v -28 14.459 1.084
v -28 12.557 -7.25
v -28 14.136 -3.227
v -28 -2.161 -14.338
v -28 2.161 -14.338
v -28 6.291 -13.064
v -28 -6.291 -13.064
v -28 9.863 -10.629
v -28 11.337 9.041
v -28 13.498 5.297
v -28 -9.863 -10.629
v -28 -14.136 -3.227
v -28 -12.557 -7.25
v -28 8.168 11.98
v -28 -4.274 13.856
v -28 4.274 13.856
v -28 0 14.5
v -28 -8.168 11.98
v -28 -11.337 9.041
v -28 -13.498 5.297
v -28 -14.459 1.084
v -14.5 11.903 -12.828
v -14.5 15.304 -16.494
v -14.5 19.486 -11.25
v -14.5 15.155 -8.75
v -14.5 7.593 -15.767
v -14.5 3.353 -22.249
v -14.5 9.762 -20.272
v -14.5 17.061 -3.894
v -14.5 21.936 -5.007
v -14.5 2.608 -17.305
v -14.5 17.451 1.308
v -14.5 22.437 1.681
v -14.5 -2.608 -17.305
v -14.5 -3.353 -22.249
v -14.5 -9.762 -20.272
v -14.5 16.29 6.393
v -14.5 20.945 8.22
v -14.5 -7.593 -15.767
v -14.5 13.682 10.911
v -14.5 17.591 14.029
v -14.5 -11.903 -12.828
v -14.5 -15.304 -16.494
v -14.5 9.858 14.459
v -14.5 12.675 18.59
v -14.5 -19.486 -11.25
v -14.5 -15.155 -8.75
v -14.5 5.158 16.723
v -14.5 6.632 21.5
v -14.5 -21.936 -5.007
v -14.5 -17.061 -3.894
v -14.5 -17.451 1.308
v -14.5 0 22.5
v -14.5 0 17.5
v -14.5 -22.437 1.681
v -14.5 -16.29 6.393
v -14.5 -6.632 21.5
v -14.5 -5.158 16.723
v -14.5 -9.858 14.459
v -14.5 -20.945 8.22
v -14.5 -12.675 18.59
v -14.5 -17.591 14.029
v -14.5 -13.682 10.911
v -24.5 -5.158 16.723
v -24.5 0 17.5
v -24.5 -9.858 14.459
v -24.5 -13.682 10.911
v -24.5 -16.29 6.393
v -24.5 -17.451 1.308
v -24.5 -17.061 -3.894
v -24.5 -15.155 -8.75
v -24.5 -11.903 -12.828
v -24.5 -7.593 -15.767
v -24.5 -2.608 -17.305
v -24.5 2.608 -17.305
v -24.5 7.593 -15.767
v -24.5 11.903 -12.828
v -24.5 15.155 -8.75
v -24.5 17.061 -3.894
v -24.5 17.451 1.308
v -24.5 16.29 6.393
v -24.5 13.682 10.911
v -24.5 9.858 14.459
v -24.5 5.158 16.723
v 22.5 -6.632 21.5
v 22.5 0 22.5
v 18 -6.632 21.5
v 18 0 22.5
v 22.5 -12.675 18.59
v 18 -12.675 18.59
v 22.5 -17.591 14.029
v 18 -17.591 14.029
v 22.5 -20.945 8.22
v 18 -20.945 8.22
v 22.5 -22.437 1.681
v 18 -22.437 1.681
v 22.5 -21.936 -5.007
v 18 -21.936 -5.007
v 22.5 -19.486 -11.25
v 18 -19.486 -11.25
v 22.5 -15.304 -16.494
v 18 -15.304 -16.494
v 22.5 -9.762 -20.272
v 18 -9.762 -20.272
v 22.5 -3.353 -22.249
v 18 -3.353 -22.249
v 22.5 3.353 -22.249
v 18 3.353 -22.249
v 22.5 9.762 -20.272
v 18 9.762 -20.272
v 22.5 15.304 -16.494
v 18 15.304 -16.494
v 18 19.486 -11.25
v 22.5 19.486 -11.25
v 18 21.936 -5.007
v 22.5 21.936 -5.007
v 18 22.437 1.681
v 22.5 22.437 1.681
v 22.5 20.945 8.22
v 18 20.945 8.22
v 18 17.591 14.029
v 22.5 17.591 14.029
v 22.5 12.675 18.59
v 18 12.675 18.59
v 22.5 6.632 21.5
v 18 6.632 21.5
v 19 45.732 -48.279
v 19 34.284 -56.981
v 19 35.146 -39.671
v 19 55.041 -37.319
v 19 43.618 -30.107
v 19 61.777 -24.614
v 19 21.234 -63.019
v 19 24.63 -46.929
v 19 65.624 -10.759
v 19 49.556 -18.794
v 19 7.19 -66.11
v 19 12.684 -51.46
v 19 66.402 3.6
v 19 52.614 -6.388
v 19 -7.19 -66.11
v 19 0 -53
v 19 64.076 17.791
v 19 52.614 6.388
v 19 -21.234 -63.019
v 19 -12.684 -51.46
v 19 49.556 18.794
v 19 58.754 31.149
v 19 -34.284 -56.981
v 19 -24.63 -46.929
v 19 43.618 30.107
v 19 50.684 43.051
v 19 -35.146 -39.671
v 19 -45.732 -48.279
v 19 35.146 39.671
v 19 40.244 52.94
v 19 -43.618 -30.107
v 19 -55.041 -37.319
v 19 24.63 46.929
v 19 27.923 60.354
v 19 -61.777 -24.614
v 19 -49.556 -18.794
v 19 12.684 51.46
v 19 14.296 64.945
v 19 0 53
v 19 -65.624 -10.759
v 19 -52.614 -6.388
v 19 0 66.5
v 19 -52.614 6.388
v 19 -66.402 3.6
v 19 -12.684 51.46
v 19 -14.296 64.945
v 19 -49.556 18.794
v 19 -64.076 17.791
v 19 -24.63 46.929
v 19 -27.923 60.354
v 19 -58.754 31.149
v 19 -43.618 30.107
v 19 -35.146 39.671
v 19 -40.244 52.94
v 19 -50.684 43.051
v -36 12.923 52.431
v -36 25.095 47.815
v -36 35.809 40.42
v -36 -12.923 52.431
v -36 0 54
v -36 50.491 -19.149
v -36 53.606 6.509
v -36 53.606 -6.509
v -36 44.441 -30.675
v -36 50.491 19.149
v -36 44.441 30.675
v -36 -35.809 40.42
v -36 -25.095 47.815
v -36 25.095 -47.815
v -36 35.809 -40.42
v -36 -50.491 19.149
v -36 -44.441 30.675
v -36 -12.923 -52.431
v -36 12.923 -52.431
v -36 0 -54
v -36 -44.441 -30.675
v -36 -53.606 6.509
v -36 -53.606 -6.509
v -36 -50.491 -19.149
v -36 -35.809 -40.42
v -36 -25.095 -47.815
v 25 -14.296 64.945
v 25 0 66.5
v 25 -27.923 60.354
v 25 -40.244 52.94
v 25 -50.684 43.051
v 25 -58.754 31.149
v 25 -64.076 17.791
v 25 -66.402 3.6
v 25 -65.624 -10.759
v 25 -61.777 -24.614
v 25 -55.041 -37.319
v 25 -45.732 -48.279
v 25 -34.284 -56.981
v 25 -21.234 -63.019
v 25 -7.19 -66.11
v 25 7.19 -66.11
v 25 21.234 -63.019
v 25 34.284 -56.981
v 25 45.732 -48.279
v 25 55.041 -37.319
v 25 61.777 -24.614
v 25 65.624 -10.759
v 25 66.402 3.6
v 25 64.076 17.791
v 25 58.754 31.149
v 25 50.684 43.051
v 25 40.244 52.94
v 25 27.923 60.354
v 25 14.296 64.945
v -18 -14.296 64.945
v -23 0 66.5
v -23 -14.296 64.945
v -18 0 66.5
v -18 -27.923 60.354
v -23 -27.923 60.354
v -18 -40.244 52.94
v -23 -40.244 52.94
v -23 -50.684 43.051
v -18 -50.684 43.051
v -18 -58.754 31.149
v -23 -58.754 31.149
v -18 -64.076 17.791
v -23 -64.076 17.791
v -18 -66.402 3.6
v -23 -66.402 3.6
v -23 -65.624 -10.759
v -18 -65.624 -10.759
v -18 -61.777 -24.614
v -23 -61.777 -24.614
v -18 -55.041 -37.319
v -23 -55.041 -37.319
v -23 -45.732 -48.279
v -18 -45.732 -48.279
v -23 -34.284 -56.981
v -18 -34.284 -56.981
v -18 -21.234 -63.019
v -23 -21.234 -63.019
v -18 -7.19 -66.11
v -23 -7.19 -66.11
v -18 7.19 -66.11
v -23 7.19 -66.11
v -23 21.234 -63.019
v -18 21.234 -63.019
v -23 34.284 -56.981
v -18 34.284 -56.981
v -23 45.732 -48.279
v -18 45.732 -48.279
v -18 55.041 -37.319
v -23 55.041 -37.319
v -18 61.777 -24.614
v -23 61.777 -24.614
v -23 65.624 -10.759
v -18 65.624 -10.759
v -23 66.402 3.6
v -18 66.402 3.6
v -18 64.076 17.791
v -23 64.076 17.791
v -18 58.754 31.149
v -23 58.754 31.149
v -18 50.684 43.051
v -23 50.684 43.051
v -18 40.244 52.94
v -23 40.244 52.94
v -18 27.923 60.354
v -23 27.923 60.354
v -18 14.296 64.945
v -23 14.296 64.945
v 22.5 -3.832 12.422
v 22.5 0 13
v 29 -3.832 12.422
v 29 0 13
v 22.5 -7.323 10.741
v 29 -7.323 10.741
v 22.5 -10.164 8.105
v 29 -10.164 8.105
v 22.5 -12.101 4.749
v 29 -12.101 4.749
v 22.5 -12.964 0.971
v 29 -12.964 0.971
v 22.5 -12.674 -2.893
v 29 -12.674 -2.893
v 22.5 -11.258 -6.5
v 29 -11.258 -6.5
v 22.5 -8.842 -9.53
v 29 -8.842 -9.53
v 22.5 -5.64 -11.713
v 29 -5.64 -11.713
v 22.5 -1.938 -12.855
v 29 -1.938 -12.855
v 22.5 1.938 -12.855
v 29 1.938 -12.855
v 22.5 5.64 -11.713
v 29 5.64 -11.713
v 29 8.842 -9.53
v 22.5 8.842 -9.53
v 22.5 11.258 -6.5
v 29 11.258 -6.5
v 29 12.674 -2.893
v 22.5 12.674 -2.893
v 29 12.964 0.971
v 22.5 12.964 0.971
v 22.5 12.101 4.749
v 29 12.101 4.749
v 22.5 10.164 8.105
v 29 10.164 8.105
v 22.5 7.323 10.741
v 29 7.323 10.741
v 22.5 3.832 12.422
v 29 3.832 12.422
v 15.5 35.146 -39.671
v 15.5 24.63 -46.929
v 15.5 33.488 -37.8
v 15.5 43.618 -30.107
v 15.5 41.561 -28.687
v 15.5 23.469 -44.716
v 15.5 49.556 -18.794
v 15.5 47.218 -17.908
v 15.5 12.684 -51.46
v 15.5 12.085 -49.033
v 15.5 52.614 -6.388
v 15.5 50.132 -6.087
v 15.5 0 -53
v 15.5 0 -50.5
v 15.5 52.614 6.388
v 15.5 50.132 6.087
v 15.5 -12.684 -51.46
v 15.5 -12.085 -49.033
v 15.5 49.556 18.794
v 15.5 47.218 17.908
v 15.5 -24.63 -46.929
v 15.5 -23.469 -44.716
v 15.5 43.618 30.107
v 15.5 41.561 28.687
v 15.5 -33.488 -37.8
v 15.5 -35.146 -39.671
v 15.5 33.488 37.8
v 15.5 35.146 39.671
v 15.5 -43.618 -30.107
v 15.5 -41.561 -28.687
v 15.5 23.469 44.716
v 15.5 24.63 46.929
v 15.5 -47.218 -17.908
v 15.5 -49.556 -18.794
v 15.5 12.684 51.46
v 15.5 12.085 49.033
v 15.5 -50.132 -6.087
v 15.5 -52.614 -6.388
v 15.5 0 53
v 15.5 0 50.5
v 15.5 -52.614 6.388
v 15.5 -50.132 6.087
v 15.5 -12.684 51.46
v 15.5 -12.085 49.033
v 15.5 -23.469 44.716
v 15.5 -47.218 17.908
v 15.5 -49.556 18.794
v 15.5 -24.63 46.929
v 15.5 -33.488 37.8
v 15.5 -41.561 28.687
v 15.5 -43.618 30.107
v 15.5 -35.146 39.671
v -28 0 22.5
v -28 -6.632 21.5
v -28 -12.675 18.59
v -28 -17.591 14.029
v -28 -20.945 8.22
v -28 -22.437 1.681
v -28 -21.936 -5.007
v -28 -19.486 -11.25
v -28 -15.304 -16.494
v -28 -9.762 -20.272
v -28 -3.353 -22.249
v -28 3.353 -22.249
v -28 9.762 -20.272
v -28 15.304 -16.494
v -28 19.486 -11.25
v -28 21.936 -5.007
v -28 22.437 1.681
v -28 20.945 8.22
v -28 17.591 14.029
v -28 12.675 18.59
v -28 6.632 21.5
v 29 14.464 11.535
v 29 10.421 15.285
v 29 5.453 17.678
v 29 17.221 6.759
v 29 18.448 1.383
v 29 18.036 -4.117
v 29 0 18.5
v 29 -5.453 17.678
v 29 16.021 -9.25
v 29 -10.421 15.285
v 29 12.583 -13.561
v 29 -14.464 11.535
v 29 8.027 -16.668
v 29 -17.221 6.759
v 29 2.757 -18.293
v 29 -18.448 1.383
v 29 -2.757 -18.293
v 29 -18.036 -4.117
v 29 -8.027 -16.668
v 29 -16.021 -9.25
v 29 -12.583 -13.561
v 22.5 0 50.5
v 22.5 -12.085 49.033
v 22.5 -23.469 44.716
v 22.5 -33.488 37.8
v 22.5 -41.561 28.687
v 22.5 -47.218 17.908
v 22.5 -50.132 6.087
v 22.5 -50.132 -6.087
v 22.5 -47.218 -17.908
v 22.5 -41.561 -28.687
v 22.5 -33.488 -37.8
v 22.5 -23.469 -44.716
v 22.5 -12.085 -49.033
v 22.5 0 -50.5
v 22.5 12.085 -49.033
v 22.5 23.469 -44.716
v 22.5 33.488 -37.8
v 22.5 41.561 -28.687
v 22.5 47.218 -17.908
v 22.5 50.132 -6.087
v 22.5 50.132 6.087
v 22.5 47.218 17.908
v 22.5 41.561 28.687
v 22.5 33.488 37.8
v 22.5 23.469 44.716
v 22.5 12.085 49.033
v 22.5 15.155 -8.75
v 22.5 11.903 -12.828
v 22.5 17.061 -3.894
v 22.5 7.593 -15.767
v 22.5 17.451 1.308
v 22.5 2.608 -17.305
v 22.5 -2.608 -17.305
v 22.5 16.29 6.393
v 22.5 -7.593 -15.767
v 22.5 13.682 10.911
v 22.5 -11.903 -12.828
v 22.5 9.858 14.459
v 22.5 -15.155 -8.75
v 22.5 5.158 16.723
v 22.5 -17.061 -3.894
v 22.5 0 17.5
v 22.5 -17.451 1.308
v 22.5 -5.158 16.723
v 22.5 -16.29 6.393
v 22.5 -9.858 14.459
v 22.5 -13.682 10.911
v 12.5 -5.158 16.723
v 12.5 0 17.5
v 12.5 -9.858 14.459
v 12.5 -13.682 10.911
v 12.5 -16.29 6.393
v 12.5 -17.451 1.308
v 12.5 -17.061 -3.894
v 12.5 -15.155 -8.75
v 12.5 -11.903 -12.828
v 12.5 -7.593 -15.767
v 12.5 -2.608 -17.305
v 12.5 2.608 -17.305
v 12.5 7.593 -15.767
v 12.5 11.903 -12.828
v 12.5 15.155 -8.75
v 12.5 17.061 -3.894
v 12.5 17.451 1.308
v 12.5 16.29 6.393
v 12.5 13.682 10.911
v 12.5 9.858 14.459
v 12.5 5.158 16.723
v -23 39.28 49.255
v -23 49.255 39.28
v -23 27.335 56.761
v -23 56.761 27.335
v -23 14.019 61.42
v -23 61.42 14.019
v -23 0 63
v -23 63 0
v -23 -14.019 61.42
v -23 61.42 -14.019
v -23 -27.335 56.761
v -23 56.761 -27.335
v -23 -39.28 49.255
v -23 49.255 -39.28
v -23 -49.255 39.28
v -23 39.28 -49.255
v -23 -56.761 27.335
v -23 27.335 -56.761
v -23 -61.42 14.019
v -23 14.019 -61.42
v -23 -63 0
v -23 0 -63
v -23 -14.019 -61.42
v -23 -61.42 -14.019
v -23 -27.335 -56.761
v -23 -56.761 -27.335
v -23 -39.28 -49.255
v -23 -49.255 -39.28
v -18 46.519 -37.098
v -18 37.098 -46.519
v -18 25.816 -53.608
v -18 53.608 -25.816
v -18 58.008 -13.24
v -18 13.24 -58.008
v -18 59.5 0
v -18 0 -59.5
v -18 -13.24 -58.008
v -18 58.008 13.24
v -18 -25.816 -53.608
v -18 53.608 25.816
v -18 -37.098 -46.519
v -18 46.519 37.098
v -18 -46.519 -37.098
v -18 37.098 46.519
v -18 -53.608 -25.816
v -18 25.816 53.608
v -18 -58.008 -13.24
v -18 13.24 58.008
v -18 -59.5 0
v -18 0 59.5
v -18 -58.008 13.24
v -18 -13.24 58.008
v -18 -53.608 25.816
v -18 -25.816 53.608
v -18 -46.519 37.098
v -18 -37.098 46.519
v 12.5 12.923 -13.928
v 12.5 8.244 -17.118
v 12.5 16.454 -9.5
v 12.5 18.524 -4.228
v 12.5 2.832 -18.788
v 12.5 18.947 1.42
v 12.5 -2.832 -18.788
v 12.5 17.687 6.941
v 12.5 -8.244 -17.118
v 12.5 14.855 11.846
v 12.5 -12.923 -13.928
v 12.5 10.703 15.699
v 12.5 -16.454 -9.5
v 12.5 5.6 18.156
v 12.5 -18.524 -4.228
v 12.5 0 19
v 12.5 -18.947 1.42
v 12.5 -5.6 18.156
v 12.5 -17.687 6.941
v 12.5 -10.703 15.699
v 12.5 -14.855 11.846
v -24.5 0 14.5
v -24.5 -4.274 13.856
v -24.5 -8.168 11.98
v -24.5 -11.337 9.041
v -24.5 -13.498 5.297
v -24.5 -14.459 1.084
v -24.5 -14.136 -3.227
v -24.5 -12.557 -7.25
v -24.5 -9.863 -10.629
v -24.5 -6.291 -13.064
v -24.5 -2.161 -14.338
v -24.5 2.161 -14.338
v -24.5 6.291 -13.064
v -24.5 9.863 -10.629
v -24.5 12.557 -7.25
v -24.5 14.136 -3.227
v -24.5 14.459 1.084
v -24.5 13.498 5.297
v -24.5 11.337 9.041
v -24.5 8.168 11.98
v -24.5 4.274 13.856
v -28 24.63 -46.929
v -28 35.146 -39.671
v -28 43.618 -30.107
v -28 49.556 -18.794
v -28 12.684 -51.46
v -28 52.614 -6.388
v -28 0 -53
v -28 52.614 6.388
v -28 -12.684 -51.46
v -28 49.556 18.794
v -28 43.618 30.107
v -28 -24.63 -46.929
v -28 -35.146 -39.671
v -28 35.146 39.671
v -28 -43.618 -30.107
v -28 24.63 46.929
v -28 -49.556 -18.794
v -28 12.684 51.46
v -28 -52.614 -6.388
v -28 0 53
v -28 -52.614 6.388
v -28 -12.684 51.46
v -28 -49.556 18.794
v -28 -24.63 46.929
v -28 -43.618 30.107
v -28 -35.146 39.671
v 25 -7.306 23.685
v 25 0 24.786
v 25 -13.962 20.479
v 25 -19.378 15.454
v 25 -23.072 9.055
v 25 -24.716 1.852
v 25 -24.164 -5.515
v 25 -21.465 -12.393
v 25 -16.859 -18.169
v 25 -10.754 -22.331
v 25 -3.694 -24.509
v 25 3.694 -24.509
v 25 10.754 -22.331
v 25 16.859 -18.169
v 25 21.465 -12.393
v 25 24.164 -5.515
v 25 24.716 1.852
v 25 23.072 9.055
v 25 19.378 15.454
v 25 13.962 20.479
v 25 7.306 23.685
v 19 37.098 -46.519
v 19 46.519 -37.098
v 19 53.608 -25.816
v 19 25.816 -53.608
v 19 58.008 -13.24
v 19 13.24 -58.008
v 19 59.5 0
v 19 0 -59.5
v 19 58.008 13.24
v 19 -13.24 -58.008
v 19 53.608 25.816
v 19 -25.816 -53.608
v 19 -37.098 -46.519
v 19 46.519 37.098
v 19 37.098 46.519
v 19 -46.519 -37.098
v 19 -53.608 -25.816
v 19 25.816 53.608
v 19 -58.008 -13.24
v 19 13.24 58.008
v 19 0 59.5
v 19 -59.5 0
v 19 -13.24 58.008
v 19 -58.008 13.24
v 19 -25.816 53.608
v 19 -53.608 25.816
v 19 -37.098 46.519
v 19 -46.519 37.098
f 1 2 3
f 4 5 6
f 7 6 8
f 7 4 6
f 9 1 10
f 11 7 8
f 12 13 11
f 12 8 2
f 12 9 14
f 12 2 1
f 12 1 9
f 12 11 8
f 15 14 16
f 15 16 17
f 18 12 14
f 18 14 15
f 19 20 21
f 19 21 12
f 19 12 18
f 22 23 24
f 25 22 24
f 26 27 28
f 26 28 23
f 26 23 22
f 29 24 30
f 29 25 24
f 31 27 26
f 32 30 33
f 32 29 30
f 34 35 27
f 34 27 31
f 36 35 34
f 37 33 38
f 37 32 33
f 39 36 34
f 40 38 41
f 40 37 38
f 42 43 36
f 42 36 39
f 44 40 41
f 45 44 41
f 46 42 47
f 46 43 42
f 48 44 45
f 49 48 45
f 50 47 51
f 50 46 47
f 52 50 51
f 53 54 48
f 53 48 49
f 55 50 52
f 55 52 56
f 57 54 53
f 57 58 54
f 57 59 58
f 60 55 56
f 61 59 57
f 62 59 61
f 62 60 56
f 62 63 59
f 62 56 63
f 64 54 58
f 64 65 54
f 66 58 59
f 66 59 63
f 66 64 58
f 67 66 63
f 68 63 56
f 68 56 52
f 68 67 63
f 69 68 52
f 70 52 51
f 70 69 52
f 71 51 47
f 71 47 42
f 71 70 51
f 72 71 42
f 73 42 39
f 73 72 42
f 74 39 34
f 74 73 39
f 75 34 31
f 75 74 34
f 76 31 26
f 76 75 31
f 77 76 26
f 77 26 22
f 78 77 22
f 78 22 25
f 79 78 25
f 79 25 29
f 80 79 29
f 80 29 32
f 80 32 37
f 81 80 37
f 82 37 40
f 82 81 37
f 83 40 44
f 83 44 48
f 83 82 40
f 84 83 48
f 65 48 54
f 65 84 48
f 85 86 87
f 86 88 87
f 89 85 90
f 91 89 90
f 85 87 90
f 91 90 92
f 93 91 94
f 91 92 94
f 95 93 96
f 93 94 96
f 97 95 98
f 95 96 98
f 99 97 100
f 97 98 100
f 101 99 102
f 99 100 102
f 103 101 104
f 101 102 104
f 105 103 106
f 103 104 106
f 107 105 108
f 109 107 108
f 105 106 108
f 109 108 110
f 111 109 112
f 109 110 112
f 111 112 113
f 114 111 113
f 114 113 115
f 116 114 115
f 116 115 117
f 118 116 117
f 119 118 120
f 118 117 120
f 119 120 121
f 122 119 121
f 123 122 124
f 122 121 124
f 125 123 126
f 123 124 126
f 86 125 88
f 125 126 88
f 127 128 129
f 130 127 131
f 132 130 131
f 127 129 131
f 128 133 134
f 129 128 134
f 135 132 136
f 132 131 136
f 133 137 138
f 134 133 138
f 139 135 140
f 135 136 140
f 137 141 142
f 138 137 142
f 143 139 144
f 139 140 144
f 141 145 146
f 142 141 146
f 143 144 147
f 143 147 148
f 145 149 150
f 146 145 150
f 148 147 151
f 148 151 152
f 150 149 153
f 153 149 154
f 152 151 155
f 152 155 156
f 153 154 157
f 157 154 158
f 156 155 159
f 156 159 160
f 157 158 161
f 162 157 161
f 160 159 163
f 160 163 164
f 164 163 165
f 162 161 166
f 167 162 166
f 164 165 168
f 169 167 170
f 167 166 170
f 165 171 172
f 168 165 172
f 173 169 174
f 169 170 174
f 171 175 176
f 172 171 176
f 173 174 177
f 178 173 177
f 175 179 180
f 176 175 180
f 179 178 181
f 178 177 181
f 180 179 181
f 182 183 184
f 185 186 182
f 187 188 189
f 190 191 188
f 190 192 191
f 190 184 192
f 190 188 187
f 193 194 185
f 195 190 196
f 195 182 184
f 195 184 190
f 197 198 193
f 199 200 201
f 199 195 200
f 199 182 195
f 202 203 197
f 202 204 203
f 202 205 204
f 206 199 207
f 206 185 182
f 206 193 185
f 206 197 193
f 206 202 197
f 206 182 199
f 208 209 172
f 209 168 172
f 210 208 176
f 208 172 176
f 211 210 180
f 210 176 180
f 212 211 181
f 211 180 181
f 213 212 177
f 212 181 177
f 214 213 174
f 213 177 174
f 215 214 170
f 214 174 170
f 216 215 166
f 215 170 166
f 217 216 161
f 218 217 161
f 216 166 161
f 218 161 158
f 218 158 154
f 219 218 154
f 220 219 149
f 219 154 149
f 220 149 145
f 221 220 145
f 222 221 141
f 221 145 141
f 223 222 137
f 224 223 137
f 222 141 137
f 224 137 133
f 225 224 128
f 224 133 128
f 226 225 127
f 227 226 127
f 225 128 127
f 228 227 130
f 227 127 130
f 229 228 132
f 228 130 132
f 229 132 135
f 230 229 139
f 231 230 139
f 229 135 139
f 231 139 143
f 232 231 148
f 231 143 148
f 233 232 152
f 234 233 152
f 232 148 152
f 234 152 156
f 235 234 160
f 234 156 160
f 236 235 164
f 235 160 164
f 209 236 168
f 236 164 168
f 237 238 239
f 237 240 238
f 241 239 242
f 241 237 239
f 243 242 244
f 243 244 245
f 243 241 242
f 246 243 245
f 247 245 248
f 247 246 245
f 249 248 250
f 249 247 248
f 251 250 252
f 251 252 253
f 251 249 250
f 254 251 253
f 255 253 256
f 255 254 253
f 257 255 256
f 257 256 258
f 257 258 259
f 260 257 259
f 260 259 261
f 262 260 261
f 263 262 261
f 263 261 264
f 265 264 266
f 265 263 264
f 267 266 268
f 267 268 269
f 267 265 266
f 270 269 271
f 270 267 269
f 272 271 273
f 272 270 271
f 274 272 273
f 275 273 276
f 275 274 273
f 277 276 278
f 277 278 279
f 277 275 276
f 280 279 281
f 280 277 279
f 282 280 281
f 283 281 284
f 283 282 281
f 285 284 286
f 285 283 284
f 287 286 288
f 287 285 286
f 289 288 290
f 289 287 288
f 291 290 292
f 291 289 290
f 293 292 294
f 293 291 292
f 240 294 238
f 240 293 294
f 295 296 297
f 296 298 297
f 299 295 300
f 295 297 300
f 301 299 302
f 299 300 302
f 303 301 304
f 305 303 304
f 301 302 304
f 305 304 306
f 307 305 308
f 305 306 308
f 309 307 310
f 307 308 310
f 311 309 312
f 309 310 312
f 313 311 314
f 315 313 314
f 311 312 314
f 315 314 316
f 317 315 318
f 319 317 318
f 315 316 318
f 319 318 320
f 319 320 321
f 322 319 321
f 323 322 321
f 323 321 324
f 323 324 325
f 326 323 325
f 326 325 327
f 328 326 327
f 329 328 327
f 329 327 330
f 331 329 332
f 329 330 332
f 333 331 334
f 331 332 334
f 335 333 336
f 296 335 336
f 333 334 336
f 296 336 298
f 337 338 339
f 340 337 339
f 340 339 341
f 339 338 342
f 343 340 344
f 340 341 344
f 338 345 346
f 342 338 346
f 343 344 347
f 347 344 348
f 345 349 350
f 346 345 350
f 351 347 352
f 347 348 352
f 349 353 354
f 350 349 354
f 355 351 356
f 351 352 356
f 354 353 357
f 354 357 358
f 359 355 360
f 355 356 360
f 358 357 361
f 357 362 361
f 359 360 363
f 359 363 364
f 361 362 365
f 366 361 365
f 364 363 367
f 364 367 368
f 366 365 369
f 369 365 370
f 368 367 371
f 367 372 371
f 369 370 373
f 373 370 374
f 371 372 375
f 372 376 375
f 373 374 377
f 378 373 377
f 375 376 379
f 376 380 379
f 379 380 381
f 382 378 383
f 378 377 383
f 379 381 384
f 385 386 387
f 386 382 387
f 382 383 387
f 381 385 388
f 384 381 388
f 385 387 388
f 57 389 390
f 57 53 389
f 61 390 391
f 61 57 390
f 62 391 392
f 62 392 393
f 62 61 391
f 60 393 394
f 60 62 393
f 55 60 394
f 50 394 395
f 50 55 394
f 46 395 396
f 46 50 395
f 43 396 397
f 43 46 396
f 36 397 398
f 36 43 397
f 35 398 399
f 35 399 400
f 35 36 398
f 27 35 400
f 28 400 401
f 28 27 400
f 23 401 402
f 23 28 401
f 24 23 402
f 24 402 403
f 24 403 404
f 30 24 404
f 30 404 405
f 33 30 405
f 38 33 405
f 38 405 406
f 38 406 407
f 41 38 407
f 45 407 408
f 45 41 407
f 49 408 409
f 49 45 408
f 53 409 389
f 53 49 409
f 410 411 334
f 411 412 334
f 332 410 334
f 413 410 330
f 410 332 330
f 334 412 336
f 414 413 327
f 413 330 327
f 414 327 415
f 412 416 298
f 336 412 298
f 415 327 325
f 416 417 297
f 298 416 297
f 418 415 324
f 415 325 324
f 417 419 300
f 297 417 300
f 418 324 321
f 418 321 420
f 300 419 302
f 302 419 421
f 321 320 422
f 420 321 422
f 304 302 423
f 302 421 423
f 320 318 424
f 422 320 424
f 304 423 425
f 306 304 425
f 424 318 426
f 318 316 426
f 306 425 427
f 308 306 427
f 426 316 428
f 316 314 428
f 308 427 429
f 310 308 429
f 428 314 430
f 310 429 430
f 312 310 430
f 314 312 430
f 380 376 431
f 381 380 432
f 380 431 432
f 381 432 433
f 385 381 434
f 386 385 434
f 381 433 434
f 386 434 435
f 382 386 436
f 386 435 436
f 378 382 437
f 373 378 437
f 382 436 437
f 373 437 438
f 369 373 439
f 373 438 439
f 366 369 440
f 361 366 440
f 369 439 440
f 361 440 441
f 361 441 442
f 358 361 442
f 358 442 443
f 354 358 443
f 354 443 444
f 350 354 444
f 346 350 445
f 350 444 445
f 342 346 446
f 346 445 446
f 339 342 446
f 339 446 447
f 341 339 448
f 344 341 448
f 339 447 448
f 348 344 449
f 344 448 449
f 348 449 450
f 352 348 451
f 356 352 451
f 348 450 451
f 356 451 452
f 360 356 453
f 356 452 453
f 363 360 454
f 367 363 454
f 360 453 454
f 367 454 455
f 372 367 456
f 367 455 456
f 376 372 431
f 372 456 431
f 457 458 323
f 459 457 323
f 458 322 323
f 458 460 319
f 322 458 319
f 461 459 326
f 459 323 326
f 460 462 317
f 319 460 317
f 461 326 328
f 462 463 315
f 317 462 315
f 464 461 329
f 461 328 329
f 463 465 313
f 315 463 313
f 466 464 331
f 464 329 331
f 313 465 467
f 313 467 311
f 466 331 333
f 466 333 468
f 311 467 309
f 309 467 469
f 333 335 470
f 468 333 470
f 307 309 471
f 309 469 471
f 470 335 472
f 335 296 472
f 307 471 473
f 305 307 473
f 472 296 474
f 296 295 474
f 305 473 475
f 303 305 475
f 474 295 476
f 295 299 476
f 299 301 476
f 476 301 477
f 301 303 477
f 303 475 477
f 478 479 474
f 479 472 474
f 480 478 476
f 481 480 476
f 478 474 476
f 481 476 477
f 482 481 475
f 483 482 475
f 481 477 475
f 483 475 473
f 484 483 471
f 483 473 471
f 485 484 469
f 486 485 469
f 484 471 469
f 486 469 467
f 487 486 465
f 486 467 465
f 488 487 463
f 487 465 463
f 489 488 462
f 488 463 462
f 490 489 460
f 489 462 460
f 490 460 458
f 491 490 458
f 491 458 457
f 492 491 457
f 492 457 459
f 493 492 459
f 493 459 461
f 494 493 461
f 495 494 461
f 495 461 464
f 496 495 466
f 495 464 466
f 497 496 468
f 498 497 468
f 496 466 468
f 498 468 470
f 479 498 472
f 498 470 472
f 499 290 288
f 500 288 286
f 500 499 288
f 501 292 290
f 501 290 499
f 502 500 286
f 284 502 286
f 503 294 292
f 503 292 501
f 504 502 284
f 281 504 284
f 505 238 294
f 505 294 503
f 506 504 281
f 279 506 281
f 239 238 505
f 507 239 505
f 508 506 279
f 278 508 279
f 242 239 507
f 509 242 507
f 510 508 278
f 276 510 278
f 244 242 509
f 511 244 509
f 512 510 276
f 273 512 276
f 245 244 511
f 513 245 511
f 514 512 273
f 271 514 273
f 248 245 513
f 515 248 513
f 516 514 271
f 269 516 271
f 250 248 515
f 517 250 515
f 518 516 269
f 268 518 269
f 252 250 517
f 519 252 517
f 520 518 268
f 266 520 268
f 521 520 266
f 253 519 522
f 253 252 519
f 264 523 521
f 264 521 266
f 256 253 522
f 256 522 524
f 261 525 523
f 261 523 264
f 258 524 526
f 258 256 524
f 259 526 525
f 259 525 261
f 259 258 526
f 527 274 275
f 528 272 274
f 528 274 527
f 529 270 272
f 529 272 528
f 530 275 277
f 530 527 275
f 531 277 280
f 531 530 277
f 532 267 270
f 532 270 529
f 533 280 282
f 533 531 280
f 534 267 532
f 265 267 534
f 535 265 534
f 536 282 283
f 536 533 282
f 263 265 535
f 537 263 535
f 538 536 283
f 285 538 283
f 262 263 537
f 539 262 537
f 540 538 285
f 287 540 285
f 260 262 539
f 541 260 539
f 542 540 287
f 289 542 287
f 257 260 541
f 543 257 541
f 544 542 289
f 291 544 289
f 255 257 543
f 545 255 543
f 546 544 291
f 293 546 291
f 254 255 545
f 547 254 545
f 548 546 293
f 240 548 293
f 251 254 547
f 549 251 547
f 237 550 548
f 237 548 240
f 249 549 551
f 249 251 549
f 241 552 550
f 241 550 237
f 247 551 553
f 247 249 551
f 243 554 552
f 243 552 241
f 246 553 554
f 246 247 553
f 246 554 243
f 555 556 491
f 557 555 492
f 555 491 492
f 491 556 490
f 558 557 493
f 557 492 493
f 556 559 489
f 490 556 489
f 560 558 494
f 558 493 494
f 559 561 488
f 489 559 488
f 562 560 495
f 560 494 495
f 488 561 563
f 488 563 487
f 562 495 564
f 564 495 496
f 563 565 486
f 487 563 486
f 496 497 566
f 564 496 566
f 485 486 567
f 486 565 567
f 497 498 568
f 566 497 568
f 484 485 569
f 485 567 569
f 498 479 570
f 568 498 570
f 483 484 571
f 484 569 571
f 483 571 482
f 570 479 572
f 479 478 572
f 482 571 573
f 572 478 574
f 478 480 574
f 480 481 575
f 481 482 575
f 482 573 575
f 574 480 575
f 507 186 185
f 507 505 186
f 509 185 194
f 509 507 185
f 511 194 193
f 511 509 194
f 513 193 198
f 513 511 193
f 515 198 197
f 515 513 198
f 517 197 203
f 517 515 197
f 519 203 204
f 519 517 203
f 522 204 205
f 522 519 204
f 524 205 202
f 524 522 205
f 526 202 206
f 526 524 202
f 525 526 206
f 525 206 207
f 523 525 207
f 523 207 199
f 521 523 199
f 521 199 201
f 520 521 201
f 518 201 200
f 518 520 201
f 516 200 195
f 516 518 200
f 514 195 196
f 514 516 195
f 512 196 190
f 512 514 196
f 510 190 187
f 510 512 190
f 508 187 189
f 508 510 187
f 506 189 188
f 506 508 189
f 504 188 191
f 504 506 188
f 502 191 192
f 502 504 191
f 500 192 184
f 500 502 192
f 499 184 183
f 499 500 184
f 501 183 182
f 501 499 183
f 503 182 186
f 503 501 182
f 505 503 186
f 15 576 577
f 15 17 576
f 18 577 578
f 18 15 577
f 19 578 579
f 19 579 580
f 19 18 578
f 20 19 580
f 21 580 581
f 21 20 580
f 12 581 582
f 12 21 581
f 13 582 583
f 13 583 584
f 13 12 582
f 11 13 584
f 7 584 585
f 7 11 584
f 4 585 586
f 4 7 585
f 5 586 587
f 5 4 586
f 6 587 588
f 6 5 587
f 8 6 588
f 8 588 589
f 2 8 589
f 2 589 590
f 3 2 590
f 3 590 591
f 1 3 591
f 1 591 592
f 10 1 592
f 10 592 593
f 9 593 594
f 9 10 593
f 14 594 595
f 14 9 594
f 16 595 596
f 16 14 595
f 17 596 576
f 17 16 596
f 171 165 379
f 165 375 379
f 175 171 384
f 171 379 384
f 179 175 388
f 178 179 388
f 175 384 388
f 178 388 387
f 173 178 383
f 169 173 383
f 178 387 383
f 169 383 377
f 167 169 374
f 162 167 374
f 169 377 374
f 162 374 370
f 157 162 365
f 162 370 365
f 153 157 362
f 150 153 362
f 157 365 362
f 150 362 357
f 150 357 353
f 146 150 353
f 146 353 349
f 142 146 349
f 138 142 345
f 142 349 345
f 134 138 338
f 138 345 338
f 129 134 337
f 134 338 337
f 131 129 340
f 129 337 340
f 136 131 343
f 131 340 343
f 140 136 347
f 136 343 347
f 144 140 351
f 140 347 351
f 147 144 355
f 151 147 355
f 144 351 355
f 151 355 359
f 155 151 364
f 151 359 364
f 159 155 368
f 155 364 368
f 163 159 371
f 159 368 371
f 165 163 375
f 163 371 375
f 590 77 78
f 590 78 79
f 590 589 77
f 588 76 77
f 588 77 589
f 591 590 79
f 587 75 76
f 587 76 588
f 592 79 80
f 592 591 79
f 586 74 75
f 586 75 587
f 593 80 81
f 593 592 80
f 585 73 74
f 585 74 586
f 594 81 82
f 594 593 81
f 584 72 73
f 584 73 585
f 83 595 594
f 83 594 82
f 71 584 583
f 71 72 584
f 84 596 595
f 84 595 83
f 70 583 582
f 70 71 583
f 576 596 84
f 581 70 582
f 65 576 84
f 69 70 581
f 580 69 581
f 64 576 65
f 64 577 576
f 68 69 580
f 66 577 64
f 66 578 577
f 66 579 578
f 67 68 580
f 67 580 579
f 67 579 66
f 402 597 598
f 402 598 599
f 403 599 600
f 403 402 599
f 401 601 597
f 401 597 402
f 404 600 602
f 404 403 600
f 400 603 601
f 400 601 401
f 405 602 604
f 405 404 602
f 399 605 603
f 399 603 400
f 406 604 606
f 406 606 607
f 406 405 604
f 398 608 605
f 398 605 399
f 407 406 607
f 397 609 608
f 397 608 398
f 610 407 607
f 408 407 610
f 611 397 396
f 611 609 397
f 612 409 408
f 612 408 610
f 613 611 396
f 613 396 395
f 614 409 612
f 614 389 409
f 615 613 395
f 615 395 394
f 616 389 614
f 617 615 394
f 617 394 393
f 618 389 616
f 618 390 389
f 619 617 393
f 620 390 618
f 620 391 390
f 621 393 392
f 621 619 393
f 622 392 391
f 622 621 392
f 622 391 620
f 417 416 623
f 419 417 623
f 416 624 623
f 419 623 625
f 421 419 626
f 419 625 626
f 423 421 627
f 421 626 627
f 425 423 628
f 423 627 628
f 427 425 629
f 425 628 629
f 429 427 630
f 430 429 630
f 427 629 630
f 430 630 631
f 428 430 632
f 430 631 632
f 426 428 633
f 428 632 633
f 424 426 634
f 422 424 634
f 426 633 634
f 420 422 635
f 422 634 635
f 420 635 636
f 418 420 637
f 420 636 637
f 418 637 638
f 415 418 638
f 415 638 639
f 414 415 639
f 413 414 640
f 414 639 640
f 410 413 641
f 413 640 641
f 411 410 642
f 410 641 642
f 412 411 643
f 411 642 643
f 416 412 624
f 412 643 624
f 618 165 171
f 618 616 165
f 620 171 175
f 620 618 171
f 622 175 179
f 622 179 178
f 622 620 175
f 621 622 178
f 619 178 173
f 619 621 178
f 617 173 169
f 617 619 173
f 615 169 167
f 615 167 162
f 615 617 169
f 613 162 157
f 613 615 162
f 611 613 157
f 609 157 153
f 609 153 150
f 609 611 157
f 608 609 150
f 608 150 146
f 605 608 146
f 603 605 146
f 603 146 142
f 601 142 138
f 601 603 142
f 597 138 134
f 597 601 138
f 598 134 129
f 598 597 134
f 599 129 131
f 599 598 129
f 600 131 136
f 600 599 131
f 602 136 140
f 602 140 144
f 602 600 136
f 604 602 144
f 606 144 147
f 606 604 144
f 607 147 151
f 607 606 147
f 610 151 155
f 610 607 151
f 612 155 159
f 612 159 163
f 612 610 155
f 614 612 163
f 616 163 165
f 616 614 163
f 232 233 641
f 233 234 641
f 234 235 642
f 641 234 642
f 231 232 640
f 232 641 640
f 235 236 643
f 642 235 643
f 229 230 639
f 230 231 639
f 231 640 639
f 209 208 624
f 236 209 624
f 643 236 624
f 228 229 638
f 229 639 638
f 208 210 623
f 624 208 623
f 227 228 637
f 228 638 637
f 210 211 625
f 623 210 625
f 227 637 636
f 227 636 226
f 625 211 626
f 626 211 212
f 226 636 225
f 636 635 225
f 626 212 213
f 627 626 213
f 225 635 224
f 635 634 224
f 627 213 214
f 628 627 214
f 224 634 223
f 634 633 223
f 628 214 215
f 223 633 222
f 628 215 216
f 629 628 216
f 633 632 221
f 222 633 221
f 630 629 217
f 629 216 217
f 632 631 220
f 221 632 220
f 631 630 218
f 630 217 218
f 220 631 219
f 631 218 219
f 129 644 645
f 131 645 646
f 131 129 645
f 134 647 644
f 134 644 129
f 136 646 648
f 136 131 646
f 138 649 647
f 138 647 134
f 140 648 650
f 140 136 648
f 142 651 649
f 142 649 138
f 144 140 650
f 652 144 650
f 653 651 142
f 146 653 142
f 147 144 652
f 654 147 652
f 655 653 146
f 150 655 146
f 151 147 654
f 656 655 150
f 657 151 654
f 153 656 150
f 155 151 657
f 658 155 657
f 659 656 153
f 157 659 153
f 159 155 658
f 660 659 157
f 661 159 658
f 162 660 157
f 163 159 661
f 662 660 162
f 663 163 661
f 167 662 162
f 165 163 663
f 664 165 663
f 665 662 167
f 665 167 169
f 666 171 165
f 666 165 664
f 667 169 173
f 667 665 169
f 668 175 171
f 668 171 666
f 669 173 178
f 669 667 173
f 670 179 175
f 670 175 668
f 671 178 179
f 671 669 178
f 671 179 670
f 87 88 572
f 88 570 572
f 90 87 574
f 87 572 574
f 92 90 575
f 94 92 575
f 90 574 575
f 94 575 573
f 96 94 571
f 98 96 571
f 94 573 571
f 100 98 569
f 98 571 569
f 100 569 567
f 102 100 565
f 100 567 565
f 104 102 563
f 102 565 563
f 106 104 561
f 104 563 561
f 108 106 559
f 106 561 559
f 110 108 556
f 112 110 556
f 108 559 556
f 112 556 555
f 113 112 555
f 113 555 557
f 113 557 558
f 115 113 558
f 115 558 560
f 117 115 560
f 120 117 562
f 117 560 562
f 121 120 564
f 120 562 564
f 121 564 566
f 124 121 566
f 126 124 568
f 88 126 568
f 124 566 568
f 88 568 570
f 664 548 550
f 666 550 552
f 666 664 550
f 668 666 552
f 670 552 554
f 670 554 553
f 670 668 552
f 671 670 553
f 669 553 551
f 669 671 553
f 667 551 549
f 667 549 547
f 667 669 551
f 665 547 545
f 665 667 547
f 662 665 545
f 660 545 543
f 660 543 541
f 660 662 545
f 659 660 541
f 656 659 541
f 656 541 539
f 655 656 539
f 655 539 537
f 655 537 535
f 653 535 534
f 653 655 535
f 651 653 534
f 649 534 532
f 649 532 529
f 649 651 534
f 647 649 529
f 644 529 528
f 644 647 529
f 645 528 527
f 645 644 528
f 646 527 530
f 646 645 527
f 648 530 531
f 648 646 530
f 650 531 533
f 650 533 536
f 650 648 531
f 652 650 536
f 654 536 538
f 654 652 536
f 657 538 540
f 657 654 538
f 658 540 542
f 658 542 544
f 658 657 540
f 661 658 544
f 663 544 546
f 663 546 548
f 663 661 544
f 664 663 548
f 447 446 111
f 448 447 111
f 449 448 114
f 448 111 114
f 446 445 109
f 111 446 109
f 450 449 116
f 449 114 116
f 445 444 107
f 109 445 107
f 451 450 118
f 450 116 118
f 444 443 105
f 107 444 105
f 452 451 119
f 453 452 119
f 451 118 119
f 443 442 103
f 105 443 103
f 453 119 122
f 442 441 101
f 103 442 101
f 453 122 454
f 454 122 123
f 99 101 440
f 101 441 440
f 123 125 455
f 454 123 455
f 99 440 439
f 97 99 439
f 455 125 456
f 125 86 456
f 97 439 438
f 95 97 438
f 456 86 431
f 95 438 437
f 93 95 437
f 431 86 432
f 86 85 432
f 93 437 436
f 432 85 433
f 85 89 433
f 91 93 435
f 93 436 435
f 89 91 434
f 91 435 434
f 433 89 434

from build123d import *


with BuildPart() as part:
    # Sketch2 → Revolve1 (revolve)
    with BuildSketch(Plane.XY, mode=Mode.PRIVATE) as revolve1_sk:
        Polygon((-36, 0), (-36, 54), (-23, 63), (-23, 66.5), (-18, 66.5), (-18, 59.5), (19, 59.5), (19, 53), (-28, 53), (-28, 22.5), (-14.5, 22.5), (-14.5, 17.5), (-24.5, 17.5), (-24.5, 14.5), (-28, 14.5), (-28, 0), align=None)
    revolve(revolve1_sk.sketch.rotate(Axis((-84.605982482, 0, 0), (1, 0, 0)), 90), axis=Axis((-84.605982482, 0, 0), (1, 0, 0)))  # turned: the seam where the file's is


with BuildPart() as body_2:
    # Sketch2_3 → Revolve2 (revolve)
    with BuildSketch(Plane.XY, mode=Mode.PRIVATE) as revolve2_sk:
        Polygon((19, 66.5), (19, 59.5), (19, 53), (15.5, 53), (15.5, 50.5), (22.5, 50.5), (22.5, 22.5), (18, 22.5), (12.5, 19), (12.5, 17.5), (22.5, 17.5), (22.5, 13), (29, 13), (29, 18.5), (25, 24.785714286), (25, 66.5), align=None)
    revolve(revolve2_sk.sketch.rotate(Axis((-84.605982482, 0, 0), (1, 0, 0)), 90), axis=Axis((-84.605982482, 0, 0), (1, 0, 0)))  # turned: the seam where the file's is


solid = Compound([part.part, body_2.part])
